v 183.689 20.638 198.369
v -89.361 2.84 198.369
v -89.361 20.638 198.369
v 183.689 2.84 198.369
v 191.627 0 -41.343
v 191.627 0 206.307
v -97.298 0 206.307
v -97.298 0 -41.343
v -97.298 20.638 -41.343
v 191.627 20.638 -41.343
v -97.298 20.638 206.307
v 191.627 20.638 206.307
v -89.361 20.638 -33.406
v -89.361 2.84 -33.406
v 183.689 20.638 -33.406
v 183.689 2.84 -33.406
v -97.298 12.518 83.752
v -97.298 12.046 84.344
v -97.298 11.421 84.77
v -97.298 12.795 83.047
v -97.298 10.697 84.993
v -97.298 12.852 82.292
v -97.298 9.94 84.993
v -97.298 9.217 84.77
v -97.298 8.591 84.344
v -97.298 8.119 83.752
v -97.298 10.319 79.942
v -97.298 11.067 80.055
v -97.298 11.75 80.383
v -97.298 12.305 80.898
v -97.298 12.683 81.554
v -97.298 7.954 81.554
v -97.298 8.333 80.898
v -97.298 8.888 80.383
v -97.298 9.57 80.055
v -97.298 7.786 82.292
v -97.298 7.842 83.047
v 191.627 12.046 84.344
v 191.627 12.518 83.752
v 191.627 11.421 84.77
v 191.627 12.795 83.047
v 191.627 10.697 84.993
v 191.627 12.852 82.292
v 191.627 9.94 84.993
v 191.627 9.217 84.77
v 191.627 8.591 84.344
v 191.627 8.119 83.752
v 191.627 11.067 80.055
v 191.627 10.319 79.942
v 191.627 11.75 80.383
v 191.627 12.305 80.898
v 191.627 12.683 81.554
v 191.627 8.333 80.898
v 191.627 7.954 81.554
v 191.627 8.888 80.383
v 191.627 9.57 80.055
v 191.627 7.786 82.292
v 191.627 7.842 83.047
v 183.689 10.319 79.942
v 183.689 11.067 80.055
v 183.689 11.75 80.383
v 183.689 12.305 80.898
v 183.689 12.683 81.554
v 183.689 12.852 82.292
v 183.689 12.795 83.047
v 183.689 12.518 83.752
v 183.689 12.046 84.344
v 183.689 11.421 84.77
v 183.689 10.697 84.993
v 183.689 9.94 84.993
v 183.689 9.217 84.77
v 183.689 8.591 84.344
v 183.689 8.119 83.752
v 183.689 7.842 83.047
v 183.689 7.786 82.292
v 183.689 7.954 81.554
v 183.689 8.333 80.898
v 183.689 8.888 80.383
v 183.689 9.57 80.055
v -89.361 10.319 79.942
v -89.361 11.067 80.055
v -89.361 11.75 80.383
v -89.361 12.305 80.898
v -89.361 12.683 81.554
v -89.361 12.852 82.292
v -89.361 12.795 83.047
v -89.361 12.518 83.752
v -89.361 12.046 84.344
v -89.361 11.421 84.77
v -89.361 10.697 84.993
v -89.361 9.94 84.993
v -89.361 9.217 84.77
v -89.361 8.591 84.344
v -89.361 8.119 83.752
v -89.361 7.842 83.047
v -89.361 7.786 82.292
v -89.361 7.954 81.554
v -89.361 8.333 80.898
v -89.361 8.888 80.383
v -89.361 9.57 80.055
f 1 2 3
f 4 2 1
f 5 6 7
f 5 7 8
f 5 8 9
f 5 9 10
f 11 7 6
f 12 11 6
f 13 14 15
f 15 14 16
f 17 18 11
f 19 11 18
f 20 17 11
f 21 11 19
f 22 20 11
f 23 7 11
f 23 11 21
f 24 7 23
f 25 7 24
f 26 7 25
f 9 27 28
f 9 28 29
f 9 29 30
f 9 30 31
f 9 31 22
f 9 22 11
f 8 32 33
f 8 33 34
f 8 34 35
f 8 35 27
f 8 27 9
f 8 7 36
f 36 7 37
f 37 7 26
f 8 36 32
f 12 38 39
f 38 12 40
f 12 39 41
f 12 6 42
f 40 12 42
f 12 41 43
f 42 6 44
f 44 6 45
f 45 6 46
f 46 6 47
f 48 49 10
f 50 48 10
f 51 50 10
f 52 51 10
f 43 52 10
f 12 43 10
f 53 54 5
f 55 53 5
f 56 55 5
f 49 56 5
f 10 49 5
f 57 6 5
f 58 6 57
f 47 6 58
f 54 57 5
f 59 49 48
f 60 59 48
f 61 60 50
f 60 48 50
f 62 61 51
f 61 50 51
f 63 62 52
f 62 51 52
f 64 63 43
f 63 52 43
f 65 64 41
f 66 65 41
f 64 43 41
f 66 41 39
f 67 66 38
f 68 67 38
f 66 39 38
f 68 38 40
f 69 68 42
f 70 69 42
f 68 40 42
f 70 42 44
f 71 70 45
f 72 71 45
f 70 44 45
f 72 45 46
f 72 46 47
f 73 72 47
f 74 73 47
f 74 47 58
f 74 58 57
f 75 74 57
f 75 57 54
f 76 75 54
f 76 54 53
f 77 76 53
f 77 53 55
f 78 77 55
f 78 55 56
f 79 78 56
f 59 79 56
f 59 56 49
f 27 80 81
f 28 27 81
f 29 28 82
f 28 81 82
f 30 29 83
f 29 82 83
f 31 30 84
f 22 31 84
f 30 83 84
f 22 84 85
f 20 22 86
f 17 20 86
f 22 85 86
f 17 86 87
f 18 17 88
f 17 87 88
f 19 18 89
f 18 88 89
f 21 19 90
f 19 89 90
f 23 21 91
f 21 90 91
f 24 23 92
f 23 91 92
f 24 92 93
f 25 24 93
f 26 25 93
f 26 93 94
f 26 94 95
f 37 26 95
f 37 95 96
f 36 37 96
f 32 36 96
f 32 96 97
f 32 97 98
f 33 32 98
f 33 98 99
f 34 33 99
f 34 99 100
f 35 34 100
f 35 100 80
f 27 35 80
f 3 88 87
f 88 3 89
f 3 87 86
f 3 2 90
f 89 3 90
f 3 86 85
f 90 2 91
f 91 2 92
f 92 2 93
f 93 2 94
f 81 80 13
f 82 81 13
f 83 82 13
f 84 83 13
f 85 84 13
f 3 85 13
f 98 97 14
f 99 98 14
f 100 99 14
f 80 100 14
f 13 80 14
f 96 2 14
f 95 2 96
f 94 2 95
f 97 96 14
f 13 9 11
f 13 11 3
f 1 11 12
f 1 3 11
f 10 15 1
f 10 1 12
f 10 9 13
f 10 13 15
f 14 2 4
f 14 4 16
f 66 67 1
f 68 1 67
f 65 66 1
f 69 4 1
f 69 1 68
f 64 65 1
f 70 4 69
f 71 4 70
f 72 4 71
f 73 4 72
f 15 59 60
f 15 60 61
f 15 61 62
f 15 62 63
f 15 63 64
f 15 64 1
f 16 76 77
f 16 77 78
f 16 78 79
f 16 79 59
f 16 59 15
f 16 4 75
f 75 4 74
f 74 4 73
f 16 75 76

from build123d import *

# Parameters (mm, degrees)
SKETCH1_W           = 288.925
SKETCH1_H           = 247.65
SKETCH1_W_2         = 273.05
SKETCH1_H_2         = 231.775
BOSS_EXTRUDE1_DEPTH = 20.6375
SKETCH2_W           = 231.775
SKETCH2_H           = 2.839616755
BOSS_EXTRUDE2_DEPTH = 273.05
SKETCH3_R           = 2.54
CUT_EXTRUDE1_DEPTH  = 356.620697252


with BuildPart() as part:
    # Sketch1 → Boss-Extrude1 (new body)
    with BuildSketch(Plane(origin=(0, 0, 0), x_dir=(1, 0, 0), z_dir=(0, 1, 0))):
        with Locations((47.164436759, -82.481854668)):
            Rectangle(SKETCH1_W, SKETCH1_H)
        with Locations((47.164436759, -82.481854668)):
            Rectangle(SKETCH1_W_2, SKETCH1_H_2, mode=Mode.SUBTRACT)
    extrude(amount=BOSS_EXTRUDE1_DEPTH)

    # Sketch2 → Boss-Extrude2 (add)
    with BuildSketch(Plane(origin=(-89.360563241, 0, 0), x_dir=(0, 0, -1), z_dir=(1, 0, 0))):
        with Locations((-82.481854668, 1.419808378)):
            Rectangle(SKETCH2_W, SKETCH2_H)
    extrude(amount=BOSS_EXTRUDE2_DEPTH)

    # Sketch3 → Cut-Extrude1 (cut, through all)
    with BuildSketch(Plane(origin=(191.626936759, 0, 0), x_dir=(0, 0, -1), z_dir=(1, 0, 0))):
        with Locations((-82.481854668, 10.31875)):
            Circle(SKETCH3_R)
    extrude(amount=-CUT_EXTRUDE1_DEPTH, mode=Mode.SUBTRACT)


solid = part.part
